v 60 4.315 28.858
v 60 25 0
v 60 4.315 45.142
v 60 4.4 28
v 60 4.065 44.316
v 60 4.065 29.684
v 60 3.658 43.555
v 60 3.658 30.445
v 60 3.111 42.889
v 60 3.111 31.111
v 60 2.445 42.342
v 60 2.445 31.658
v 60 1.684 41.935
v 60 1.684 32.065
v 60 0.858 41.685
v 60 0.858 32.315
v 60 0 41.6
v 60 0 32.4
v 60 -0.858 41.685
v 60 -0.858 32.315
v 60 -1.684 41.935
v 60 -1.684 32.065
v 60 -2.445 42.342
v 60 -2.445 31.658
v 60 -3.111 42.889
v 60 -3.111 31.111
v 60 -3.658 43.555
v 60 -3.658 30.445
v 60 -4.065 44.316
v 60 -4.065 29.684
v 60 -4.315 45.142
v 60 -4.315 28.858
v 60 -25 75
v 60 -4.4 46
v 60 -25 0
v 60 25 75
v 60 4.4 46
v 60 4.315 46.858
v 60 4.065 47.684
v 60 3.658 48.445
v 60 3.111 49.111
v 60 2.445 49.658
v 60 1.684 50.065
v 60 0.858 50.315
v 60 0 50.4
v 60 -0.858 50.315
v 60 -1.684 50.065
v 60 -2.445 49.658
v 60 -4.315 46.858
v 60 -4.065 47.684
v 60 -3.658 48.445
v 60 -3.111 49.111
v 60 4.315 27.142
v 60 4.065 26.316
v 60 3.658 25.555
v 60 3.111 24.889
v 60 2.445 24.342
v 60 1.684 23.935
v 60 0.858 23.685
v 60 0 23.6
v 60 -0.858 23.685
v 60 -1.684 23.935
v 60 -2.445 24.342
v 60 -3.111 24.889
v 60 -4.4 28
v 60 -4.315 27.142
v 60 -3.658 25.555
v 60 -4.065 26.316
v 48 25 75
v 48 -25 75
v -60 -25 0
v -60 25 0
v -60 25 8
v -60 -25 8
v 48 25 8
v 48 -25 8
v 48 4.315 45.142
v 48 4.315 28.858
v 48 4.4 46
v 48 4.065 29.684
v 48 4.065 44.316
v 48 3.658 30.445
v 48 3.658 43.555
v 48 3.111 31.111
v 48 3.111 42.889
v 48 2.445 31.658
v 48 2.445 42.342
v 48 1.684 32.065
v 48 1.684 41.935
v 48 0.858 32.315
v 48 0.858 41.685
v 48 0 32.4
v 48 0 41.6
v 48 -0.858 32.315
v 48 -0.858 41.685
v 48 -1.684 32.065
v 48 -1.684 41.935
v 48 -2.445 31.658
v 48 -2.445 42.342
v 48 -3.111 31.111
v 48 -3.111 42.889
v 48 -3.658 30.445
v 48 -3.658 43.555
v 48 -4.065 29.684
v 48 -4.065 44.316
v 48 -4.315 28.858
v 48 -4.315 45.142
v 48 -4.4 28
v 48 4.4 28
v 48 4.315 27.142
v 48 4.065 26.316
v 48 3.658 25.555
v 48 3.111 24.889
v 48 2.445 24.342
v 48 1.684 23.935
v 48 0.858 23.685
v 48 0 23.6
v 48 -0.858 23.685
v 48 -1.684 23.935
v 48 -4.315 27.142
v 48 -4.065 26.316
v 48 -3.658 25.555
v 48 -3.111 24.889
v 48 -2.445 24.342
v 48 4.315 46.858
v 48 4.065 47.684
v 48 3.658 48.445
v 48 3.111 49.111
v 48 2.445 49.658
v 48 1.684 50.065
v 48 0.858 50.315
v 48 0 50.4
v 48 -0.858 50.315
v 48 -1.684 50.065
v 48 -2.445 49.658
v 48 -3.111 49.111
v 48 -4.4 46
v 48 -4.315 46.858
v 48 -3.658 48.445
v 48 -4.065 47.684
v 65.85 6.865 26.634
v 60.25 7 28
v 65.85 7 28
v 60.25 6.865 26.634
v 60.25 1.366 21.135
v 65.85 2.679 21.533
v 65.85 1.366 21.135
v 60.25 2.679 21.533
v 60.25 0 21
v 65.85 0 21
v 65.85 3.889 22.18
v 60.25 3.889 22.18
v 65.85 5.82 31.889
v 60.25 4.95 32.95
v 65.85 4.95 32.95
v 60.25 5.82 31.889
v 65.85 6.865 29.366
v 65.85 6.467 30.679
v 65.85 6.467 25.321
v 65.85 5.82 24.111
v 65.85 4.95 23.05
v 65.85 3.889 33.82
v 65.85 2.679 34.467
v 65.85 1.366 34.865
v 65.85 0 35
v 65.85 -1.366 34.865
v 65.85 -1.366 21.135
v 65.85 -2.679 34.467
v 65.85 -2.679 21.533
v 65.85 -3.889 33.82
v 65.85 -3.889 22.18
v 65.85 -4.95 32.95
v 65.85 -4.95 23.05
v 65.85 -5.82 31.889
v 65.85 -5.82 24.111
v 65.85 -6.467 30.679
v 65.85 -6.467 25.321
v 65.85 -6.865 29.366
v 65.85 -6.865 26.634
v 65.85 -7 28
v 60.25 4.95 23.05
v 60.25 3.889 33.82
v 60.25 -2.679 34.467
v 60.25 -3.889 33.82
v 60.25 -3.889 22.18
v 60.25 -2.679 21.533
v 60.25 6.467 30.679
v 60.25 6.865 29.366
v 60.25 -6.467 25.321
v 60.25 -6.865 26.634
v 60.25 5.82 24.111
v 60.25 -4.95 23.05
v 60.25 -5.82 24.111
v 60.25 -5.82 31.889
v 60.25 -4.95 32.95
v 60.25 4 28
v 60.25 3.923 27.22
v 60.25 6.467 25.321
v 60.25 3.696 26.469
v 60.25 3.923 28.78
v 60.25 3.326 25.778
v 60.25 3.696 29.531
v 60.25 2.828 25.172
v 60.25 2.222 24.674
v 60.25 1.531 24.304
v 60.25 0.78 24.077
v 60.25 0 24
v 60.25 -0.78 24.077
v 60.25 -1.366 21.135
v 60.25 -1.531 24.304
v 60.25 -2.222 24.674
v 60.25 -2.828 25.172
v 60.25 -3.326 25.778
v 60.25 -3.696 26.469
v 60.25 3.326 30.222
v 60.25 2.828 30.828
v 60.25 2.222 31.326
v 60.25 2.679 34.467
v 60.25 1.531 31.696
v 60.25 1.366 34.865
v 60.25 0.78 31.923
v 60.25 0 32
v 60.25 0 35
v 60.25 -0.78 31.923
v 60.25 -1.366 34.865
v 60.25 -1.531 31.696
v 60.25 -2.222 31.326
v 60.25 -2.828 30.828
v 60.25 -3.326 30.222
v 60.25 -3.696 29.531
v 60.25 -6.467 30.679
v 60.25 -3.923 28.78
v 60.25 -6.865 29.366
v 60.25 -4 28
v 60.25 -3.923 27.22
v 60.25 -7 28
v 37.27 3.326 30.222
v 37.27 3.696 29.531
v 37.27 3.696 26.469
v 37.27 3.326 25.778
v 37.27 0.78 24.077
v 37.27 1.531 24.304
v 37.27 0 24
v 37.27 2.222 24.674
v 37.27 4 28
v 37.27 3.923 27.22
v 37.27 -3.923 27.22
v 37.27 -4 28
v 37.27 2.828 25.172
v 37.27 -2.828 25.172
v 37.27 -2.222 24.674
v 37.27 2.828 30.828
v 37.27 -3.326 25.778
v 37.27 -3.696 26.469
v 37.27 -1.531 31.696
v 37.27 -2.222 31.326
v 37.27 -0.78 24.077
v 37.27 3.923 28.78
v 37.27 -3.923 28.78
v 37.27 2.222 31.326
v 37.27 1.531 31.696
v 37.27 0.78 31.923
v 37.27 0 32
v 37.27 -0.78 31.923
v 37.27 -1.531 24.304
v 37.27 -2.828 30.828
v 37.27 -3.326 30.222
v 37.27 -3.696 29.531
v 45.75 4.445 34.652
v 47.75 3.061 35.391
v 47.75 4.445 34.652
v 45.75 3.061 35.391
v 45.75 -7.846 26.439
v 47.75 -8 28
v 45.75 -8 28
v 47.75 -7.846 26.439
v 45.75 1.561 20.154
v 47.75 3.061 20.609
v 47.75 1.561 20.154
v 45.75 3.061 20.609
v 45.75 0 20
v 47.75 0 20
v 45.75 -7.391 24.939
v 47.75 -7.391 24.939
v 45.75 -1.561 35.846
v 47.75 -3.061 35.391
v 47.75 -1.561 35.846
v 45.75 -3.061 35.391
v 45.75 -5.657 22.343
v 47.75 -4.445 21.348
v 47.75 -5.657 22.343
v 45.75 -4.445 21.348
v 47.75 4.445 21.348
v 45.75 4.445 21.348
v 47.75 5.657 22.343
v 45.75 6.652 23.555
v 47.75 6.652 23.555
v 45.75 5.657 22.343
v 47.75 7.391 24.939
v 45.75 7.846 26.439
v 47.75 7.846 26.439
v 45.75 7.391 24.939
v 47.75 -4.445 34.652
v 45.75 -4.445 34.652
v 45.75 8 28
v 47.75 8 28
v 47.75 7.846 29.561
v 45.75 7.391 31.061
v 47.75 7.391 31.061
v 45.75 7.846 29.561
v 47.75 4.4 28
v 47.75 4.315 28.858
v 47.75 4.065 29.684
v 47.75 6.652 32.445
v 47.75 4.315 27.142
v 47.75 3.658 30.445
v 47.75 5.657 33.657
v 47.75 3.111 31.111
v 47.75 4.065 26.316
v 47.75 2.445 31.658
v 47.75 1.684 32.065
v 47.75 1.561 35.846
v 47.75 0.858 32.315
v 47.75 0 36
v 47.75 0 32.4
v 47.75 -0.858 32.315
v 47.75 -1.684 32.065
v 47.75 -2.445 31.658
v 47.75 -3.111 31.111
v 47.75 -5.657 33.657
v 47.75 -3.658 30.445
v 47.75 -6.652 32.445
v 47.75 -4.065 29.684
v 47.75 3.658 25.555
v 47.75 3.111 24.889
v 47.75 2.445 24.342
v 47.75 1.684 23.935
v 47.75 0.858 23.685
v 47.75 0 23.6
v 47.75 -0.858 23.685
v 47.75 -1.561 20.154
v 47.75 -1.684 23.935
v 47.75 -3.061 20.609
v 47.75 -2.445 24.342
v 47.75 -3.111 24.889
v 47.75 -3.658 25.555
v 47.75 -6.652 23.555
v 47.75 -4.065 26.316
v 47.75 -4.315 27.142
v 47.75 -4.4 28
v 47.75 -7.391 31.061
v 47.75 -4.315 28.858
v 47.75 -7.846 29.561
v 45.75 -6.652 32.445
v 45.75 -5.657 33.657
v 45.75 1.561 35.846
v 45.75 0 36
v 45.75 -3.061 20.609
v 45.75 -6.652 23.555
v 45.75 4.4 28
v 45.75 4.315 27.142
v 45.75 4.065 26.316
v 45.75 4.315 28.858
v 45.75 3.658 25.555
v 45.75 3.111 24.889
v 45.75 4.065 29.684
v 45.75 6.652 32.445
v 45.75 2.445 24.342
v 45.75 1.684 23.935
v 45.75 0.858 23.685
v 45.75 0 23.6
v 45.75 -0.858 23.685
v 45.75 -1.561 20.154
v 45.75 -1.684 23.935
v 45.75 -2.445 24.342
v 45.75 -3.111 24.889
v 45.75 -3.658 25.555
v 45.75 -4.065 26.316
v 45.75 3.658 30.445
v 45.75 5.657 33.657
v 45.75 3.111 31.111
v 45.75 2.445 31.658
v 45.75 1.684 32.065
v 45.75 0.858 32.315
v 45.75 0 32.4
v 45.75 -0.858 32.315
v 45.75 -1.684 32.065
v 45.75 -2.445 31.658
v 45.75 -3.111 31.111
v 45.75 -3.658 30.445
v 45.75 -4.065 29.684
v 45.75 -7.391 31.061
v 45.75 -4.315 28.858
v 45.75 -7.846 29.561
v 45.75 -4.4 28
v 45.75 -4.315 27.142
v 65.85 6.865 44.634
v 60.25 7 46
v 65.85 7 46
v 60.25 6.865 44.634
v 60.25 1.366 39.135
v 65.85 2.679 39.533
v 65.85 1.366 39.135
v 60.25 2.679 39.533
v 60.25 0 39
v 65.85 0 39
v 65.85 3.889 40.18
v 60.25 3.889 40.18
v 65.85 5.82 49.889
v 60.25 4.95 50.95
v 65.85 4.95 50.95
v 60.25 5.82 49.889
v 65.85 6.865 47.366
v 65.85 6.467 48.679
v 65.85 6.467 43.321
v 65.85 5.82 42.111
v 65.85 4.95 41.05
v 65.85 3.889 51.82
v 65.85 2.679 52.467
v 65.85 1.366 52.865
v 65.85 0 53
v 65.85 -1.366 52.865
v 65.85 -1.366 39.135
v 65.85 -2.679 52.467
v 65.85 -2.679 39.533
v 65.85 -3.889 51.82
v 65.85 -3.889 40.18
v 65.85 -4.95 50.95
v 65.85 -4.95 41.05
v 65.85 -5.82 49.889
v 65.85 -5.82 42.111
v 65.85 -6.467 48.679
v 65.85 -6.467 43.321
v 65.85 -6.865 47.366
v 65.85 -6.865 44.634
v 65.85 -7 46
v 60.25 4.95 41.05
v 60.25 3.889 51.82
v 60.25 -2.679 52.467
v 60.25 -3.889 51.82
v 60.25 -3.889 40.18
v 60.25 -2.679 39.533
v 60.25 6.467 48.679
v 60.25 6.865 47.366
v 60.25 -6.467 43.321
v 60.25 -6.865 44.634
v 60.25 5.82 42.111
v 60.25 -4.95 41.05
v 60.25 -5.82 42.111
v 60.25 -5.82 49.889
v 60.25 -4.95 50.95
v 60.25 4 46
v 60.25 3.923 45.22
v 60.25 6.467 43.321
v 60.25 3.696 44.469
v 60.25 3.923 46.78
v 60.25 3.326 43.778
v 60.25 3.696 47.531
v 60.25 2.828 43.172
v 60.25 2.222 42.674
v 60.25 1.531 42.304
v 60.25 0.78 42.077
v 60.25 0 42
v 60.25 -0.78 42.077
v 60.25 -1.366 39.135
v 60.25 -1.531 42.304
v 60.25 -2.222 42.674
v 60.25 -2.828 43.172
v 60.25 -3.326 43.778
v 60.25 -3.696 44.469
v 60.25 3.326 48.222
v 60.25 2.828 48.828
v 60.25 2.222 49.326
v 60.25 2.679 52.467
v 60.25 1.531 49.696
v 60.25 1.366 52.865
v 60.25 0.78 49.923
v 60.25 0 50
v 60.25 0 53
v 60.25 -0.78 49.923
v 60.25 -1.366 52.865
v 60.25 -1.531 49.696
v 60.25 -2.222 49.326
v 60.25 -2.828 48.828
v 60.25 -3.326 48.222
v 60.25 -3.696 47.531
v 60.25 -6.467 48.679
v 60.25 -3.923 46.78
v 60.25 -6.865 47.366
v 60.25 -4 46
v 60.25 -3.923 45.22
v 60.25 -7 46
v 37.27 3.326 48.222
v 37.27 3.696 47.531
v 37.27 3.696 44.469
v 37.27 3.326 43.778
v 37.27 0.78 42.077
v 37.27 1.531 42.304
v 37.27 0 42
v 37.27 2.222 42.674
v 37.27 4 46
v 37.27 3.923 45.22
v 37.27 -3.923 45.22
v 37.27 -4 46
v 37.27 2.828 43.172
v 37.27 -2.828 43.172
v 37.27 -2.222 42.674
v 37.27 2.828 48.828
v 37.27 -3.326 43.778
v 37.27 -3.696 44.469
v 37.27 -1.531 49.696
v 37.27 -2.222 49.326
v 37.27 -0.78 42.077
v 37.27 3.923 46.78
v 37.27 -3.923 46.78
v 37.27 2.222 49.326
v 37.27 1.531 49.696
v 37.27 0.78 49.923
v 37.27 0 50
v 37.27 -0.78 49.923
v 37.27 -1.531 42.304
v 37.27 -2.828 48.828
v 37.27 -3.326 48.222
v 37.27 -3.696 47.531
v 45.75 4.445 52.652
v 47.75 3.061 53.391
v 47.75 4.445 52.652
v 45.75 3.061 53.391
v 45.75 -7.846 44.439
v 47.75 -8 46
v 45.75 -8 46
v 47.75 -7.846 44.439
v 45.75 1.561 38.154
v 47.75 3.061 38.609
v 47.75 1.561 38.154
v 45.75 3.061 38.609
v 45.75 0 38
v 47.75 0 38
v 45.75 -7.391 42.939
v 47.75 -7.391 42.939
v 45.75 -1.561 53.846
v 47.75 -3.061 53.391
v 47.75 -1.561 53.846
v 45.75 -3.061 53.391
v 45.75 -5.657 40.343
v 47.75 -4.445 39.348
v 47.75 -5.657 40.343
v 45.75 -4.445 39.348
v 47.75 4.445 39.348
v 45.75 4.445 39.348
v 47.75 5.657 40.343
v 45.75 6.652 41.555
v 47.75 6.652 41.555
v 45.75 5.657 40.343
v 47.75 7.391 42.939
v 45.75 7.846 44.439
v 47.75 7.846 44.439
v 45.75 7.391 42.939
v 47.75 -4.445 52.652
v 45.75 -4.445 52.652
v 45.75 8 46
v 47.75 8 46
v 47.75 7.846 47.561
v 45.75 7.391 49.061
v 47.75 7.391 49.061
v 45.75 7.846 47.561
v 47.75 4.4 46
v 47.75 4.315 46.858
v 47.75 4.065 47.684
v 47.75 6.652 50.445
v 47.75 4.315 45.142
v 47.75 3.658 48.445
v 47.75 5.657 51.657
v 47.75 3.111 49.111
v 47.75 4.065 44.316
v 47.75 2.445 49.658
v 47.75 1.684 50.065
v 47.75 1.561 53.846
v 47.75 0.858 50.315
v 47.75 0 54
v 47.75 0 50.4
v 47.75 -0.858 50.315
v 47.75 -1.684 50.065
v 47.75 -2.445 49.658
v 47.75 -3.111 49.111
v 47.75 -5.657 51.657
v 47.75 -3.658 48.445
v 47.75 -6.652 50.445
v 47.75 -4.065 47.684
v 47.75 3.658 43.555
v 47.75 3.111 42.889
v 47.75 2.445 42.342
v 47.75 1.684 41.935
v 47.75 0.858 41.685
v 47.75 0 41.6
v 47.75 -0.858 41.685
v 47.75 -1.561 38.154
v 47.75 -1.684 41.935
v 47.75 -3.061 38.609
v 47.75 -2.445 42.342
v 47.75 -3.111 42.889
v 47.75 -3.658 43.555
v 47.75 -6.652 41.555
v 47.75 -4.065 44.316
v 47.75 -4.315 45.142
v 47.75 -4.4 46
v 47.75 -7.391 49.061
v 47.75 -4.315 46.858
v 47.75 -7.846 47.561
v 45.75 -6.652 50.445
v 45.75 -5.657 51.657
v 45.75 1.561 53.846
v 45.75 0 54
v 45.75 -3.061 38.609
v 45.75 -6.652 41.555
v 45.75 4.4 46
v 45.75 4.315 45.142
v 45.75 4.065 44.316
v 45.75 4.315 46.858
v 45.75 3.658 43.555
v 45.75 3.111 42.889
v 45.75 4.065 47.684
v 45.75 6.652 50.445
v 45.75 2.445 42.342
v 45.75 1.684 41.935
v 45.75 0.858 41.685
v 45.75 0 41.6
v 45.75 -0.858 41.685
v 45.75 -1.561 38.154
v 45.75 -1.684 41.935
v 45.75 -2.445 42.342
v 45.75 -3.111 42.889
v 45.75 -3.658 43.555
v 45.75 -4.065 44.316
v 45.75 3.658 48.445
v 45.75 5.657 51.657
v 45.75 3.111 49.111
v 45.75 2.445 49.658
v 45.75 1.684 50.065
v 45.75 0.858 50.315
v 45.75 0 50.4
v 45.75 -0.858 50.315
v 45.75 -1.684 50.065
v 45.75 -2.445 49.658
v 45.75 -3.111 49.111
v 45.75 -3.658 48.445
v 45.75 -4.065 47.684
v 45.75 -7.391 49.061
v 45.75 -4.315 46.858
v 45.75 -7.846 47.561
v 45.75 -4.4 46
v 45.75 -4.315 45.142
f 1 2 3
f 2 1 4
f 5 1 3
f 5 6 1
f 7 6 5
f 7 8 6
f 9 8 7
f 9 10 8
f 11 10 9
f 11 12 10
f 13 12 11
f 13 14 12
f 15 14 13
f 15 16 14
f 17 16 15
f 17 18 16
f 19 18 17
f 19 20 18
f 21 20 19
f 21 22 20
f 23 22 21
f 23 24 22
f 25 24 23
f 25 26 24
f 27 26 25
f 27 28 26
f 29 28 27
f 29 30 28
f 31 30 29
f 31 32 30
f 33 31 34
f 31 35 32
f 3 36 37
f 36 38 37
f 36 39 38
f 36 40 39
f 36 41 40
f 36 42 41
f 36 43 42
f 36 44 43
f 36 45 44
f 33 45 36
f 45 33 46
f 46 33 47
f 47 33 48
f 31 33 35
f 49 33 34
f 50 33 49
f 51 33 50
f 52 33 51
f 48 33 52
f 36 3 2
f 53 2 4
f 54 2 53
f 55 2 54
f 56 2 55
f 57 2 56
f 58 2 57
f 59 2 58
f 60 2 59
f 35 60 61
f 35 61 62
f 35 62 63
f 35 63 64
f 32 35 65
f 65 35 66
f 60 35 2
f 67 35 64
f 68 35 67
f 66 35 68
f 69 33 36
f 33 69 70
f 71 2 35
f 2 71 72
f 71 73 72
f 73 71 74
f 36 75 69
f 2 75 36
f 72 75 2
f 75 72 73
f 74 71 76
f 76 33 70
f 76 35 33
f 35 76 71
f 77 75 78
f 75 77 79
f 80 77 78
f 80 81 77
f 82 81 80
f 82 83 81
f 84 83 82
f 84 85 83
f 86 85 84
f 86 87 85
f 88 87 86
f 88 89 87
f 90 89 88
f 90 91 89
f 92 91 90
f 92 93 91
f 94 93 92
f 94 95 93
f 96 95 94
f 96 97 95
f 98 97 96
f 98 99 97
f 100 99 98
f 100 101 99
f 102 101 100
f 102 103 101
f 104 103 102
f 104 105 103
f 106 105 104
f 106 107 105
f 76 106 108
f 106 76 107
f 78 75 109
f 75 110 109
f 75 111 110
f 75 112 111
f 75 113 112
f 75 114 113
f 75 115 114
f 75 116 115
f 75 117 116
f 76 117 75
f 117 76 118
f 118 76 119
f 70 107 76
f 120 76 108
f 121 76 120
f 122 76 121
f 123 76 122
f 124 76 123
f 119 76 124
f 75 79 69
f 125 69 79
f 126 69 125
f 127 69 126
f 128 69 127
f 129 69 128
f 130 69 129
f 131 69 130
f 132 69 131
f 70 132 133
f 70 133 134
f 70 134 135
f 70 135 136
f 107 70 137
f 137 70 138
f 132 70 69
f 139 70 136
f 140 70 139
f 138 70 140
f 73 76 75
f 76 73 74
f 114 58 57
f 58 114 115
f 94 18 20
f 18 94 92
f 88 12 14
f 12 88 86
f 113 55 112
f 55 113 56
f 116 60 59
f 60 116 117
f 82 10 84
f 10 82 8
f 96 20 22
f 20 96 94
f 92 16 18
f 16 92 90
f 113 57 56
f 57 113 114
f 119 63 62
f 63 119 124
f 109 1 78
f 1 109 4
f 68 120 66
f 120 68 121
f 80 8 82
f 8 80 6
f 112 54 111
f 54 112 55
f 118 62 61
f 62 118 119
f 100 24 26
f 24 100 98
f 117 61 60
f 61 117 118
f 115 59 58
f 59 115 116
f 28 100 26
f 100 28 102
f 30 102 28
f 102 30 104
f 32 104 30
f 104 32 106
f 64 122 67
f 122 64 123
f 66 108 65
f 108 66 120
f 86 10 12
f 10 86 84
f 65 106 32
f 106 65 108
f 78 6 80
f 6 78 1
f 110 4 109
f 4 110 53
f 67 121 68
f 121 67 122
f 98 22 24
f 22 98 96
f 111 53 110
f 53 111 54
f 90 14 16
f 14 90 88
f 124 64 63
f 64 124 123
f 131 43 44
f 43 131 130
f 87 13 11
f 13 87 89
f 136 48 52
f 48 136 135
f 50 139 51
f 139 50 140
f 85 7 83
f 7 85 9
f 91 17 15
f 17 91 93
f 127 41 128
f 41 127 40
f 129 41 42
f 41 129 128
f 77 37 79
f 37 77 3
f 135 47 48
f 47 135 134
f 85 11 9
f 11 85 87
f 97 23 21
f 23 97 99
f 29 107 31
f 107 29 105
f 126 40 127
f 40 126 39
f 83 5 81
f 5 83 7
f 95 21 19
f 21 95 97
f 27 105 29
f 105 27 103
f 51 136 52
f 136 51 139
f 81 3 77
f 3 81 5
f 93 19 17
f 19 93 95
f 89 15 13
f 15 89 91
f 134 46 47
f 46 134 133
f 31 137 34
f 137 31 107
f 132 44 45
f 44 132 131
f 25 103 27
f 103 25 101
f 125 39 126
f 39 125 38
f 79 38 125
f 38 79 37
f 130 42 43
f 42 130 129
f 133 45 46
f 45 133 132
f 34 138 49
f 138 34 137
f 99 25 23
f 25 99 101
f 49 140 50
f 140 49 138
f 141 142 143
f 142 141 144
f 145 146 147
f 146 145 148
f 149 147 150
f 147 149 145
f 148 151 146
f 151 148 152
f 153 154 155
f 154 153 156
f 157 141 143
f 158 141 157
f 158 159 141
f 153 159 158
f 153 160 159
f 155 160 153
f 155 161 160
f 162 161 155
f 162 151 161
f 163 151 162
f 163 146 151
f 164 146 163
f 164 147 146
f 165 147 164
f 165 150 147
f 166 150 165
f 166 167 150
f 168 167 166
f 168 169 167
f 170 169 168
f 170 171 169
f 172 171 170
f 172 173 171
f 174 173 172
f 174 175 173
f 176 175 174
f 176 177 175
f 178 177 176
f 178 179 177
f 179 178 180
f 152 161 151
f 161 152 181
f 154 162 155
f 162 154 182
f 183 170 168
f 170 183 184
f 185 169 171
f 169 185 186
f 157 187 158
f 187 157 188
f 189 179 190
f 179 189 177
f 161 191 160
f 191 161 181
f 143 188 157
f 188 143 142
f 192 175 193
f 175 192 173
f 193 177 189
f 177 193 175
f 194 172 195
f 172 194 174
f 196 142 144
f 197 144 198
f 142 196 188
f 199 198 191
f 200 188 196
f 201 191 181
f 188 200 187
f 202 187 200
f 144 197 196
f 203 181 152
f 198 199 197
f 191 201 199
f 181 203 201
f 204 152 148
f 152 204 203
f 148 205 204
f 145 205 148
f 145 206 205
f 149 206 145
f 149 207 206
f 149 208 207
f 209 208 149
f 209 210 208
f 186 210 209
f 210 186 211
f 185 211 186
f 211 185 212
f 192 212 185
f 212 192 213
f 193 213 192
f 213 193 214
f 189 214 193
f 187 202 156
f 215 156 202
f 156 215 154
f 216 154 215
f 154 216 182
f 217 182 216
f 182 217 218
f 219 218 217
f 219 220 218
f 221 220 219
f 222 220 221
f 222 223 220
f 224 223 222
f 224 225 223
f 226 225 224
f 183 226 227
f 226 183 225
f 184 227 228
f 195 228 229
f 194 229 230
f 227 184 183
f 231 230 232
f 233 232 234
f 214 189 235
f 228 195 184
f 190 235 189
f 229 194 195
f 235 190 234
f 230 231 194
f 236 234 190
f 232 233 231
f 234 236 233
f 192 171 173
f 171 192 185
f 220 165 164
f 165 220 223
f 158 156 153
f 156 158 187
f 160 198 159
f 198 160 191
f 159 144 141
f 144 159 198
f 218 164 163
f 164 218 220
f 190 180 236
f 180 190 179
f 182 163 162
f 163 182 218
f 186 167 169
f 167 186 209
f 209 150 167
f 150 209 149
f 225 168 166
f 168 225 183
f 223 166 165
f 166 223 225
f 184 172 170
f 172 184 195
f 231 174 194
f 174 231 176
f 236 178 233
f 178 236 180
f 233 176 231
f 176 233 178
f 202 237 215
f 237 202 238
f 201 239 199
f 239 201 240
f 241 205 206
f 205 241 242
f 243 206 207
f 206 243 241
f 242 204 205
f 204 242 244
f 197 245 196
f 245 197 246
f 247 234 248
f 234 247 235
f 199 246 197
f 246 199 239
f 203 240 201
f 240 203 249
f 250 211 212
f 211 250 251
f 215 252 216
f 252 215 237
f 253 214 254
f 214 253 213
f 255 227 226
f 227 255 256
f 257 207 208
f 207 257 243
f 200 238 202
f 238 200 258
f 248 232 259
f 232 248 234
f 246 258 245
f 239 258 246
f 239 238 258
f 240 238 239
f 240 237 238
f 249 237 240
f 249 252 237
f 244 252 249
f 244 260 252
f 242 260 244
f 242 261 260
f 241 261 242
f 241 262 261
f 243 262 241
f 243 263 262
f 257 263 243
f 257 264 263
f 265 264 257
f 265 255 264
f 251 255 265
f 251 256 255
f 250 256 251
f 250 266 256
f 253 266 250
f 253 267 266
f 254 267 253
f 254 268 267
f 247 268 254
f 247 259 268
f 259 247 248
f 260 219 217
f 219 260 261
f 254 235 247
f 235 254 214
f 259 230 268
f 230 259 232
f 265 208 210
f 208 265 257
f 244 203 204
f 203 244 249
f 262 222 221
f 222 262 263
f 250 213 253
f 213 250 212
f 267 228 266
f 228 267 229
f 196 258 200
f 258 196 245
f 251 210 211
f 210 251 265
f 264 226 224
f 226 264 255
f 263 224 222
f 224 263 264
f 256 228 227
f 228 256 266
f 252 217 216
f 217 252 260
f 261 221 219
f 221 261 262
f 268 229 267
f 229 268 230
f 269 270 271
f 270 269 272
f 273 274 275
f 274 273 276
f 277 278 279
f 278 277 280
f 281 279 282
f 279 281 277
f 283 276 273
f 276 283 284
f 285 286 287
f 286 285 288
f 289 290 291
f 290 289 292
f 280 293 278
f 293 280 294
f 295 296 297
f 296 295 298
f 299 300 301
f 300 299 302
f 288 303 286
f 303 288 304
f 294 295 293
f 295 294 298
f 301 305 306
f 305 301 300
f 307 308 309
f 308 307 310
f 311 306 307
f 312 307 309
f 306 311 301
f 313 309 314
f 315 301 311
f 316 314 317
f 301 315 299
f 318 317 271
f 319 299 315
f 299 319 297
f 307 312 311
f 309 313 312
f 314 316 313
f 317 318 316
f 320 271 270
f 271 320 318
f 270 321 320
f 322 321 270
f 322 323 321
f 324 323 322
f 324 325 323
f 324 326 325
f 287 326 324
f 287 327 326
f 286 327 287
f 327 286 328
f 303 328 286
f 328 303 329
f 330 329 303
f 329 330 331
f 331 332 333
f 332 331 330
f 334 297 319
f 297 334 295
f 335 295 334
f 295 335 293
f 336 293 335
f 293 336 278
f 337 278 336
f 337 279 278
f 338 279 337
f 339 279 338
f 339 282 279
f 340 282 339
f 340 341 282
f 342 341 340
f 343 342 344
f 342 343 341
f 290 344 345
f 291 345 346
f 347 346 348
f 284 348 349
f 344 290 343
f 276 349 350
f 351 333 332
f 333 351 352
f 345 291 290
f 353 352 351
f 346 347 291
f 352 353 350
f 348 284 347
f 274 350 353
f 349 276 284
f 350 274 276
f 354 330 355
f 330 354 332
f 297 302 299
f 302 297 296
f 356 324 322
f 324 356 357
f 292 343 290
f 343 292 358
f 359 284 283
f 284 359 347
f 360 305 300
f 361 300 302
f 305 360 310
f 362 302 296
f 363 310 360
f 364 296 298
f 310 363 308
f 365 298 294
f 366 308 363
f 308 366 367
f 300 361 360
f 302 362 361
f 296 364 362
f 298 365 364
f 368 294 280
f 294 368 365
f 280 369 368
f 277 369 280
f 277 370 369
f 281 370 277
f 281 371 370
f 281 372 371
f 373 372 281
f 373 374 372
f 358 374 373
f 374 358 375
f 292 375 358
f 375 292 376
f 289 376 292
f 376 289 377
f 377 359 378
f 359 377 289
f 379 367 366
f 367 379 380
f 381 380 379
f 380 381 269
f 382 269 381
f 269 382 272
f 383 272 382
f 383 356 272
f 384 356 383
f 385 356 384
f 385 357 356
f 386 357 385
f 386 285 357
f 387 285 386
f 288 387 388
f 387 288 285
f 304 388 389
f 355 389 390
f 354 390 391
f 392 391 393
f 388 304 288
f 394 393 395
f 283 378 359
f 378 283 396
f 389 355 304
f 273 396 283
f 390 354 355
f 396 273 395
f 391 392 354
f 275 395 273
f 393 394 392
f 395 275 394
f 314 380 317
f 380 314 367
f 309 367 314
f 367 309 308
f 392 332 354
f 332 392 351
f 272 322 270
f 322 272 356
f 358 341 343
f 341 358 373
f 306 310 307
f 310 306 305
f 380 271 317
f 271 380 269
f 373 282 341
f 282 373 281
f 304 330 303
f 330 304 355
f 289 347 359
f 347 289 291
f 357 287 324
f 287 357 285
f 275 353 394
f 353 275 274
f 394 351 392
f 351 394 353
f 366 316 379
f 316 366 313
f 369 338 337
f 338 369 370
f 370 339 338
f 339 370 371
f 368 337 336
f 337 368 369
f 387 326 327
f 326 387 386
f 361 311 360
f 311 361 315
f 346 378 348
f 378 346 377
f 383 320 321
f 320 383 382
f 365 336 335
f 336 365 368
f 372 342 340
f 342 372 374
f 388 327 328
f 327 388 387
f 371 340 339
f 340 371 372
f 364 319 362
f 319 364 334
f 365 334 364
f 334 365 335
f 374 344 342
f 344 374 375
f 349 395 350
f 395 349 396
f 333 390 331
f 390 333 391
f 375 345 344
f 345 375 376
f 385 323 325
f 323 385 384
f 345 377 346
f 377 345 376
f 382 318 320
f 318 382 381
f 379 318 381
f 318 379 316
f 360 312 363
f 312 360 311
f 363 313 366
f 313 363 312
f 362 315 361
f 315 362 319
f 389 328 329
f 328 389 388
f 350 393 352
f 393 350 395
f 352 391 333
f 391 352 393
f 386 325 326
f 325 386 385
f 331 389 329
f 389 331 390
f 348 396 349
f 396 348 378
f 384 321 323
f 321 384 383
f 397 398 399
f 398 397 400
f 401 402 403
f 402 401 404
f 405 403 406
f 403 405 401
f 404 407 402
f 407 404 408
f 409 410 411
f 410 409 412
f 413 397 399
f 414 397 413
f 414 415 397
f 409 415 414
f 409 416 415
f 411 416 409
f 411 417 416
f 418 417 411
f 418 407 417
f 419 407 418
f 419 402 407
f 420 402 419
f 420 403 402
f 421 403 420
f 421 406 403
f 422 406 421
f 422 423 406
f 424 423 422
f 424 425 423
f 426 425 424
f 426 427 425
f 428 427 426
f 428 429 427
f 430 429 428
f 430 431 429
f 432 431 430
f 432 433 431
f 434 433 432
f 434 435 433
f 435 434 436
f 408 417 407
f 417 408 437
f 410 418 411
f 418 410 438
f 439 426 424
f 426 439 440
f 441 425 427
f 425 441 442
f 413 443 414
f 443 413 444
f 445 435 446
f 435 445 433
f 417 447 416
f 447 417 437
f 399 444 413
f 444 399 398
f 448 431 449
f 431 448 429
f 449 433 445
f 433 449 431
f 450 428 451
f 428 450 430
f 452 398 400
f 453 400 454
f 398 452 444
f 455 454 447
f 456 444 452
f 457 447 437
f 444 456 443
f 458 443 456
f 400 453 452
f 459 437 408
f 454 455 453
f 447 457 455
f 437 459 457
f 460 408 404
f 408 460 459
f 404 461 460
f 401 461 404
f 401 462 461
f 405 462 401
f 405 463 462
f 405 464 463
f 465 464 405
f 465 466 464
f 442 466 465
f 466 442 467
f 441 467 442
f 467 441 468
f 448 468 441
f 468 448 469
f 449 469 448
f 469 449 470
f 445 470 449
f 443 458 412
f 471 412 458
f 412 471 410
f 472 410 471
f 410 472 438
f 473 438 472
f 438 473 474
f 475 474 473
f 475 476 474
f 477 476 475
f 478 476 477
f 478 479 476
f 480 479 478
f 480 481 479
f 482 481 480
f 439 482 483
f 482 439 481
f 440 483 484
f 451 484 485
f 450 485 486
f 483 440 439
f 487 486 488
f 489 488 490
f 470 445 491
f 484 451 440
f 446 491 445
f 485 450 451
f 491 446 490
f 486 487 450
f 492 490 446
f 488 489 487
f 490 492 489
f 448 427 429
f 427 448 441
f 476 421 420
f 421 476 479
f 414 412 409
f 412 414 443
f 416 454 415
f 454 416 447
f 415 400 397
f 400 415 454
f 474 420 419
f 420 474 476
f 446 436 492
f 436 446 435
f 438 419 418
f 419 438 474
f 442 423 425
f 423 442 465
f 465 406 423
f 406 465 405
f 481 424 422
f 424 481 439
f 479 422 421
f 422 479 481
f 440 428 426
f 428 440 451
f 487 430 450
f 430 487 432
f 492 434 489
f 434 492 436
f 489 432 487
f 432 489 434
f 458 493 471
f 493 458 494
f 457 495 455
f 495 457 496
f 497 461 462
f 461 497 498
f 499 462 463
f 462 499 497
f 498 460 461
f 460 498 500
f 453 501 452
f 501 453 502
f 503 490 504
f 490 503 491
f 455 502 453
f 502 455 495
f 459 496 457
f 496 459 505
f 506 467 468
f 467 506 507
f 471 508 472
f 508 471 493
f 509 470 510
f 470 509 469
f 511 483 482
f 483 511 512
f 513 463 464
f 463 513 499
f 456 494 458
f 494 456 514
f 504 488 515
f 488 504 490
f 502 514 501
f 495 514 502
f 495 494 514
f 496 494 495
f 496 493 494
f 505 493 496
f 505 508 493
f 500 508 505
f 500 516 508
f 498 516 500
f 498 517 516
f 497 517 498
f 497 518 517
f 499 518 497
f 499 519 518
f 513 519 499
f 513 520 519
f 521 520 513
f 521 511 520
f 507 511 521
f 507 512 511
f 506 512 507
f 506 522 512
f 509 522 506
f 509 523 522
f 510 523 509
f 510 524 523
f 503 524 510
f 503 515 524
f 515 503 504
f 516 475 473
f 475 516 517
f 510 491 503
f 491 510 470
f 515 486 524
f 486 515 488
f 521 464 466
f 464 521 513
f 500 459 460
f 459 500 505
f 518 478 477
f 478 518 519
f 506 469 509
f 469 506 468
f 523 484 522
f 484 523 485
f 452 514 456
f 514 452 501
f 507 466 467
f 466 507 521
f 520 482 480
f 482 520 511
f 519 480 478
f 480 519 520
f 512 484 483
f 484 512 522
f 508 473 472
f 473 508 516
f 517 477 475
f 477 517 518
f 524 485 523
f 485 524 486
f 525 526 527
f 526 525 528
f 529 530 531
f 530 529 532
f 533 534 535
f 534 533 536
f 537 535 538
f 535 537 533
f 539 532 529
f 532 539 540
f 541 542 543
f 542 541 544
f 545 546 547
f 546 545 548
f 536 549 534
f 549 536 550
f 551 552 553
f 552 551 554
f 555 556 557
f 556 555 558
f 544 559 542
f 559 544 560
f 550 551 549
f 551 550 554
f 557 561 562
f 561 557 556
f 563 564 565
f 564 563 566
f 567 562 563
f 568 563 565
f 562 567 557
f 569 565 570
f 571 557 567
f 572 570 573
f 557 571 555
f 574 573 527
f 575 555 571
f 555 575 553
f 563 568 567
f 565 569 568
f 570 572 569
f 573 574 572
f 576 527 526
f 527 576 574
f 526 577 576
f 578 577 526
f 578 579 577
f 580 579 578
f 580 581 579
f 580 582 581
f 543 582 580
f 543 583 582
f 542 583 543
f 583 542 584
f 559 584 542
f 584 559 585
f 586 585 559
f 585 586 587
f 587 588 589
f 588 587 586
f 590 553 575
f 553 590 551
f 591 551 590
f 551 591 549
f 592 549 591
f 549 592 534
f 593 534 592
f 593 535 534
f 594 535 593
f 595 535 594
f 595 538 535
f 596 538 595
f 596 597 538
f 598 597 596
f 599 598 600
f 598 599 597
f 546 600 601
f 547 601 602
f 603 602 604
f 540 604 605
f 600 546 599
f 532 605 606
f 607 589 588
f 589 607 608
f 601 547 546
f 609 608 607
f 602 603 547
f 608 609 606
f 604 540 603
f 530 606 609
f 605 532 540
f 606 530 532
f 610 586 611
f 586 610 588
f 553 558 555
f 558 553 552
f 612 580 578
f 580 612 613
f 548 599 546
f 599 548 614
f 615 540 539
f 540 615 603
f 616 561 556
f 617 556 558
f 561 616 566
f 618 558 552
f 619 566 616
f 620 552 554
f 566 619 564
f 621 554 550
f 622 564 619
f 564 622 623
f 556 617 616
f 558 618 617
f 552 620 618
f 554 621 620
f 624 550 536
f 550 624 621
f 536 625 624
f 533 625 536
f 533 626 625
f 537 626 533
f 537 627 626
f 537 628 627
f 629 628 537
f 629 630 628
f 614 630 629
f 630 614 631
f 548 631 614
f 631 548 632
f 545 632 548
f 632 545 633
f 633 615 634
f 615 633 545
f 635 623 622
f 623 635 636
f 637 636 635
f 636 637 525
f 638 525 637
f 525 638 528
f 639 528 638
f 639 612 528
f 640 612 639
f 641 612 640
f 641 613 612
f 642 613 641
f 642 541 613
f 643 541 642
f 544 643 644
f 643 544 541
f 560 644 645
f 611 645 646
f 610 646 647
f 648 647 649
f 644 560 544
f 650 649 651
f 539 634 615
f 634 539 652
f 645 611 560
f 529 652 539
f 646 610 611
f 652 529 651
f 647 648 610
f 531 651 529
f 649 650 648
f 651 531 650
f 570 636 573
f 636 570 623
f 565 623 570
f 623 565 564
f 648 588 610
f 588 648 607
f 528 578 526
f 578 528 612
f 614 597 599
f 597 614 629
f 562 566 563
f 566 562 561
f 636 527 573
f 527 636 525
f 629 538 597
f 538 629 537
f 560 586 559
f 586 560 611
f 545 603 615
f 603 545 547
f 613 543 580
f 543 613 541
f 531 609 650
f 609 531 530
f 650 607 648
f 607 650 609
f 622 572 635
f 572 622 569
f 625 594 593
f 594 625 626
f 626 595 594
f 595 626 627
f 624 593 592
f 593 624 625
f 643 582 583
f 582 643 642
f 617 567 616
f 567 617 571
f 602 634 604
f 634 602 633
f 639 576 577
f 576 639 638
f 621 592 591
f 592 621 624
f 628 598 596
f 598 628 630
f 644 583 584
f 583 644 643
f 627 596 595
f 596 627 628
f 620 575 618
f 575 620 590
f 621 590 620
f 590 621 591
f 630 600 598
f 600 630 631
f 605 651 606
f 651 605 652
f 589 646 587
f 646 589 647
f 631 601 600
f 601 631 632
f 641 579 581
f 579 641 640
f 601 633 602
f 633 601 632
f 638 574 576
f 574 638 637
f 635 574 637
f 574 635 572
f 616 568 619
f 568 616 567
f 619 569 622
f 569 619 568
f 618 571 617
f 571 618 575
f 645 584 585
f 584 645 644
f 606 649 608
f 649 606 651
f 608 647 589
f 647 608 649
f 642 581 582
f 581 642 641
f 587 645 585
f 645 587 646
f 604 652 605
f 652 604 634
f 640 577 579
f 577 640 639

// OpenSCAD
$fn = 32;

// ------------------------------------------------------------------------
// Bolted bracket: 120 x 50 mm bracket with 2 bolt joints
// Every part is its own module, assembly() places them once.
// ------------------------------------------------------------------------

// --- part 1 ---
module bracket() {
  difference() {
    translate([-60, -25, 0]) cube([120, 50, 75]);
    translate([-61, -26, 8]) cube([109, 52, 68]);
    translate([54, 0, 28]) rotate([0, 90, 0]) cylinder(h = 14, d = 8.8, center = true);
    translate([54, 0, 46]) rotate([0, 90, 0]) cylinder(h = 14, d = 8.8, center = true);
  }
}

// --- part 2 ---
module bolt1() {
  cylinder(h = 5.6, d = 14);
  translate([0, 0, -22.98]) cylinder(h = 22.98, d = 8);
}

// --- part 3 ---
module washer1() {
  difference() {
      translate([0, 0, 0]) cylinder(h = 2, d = 16);
      translate([0, 0, -1]) cylinder(h = 4, d = 8.8);
    }
}

// --- part 4 ---
module bolt2() {
  cylinder(h = 5.6, d = 14);
  translate([0, 0, -22.98]) cylinder(h = 22.98, d = 8);
}

// --- part 5 ---
module washer2() {
  difference() {
      translate([0, 0, 0]) cylinder(h = 2, d = 16);
      translate([0, 0, -1]) cylinder(h = 4, d = 8.8);
    }
}

// --- assembly ---
module assembly() {
  translate([0, 0, 0]) rotate([0, 0, 0]) bracket();
  translate([60.25, 0, 28]) rotate([0, 90, 0]) bolt1();
  translate([45.75, 0, 28]) rotate([0, 90, 0]) washer1();
  translate([60.25, 0, 46]) rotate([0, 90, 0]) bolt2();
  translate([45.75, 0, 46]) rotate([0, 90, 0]) washer2();
}

assembly();
